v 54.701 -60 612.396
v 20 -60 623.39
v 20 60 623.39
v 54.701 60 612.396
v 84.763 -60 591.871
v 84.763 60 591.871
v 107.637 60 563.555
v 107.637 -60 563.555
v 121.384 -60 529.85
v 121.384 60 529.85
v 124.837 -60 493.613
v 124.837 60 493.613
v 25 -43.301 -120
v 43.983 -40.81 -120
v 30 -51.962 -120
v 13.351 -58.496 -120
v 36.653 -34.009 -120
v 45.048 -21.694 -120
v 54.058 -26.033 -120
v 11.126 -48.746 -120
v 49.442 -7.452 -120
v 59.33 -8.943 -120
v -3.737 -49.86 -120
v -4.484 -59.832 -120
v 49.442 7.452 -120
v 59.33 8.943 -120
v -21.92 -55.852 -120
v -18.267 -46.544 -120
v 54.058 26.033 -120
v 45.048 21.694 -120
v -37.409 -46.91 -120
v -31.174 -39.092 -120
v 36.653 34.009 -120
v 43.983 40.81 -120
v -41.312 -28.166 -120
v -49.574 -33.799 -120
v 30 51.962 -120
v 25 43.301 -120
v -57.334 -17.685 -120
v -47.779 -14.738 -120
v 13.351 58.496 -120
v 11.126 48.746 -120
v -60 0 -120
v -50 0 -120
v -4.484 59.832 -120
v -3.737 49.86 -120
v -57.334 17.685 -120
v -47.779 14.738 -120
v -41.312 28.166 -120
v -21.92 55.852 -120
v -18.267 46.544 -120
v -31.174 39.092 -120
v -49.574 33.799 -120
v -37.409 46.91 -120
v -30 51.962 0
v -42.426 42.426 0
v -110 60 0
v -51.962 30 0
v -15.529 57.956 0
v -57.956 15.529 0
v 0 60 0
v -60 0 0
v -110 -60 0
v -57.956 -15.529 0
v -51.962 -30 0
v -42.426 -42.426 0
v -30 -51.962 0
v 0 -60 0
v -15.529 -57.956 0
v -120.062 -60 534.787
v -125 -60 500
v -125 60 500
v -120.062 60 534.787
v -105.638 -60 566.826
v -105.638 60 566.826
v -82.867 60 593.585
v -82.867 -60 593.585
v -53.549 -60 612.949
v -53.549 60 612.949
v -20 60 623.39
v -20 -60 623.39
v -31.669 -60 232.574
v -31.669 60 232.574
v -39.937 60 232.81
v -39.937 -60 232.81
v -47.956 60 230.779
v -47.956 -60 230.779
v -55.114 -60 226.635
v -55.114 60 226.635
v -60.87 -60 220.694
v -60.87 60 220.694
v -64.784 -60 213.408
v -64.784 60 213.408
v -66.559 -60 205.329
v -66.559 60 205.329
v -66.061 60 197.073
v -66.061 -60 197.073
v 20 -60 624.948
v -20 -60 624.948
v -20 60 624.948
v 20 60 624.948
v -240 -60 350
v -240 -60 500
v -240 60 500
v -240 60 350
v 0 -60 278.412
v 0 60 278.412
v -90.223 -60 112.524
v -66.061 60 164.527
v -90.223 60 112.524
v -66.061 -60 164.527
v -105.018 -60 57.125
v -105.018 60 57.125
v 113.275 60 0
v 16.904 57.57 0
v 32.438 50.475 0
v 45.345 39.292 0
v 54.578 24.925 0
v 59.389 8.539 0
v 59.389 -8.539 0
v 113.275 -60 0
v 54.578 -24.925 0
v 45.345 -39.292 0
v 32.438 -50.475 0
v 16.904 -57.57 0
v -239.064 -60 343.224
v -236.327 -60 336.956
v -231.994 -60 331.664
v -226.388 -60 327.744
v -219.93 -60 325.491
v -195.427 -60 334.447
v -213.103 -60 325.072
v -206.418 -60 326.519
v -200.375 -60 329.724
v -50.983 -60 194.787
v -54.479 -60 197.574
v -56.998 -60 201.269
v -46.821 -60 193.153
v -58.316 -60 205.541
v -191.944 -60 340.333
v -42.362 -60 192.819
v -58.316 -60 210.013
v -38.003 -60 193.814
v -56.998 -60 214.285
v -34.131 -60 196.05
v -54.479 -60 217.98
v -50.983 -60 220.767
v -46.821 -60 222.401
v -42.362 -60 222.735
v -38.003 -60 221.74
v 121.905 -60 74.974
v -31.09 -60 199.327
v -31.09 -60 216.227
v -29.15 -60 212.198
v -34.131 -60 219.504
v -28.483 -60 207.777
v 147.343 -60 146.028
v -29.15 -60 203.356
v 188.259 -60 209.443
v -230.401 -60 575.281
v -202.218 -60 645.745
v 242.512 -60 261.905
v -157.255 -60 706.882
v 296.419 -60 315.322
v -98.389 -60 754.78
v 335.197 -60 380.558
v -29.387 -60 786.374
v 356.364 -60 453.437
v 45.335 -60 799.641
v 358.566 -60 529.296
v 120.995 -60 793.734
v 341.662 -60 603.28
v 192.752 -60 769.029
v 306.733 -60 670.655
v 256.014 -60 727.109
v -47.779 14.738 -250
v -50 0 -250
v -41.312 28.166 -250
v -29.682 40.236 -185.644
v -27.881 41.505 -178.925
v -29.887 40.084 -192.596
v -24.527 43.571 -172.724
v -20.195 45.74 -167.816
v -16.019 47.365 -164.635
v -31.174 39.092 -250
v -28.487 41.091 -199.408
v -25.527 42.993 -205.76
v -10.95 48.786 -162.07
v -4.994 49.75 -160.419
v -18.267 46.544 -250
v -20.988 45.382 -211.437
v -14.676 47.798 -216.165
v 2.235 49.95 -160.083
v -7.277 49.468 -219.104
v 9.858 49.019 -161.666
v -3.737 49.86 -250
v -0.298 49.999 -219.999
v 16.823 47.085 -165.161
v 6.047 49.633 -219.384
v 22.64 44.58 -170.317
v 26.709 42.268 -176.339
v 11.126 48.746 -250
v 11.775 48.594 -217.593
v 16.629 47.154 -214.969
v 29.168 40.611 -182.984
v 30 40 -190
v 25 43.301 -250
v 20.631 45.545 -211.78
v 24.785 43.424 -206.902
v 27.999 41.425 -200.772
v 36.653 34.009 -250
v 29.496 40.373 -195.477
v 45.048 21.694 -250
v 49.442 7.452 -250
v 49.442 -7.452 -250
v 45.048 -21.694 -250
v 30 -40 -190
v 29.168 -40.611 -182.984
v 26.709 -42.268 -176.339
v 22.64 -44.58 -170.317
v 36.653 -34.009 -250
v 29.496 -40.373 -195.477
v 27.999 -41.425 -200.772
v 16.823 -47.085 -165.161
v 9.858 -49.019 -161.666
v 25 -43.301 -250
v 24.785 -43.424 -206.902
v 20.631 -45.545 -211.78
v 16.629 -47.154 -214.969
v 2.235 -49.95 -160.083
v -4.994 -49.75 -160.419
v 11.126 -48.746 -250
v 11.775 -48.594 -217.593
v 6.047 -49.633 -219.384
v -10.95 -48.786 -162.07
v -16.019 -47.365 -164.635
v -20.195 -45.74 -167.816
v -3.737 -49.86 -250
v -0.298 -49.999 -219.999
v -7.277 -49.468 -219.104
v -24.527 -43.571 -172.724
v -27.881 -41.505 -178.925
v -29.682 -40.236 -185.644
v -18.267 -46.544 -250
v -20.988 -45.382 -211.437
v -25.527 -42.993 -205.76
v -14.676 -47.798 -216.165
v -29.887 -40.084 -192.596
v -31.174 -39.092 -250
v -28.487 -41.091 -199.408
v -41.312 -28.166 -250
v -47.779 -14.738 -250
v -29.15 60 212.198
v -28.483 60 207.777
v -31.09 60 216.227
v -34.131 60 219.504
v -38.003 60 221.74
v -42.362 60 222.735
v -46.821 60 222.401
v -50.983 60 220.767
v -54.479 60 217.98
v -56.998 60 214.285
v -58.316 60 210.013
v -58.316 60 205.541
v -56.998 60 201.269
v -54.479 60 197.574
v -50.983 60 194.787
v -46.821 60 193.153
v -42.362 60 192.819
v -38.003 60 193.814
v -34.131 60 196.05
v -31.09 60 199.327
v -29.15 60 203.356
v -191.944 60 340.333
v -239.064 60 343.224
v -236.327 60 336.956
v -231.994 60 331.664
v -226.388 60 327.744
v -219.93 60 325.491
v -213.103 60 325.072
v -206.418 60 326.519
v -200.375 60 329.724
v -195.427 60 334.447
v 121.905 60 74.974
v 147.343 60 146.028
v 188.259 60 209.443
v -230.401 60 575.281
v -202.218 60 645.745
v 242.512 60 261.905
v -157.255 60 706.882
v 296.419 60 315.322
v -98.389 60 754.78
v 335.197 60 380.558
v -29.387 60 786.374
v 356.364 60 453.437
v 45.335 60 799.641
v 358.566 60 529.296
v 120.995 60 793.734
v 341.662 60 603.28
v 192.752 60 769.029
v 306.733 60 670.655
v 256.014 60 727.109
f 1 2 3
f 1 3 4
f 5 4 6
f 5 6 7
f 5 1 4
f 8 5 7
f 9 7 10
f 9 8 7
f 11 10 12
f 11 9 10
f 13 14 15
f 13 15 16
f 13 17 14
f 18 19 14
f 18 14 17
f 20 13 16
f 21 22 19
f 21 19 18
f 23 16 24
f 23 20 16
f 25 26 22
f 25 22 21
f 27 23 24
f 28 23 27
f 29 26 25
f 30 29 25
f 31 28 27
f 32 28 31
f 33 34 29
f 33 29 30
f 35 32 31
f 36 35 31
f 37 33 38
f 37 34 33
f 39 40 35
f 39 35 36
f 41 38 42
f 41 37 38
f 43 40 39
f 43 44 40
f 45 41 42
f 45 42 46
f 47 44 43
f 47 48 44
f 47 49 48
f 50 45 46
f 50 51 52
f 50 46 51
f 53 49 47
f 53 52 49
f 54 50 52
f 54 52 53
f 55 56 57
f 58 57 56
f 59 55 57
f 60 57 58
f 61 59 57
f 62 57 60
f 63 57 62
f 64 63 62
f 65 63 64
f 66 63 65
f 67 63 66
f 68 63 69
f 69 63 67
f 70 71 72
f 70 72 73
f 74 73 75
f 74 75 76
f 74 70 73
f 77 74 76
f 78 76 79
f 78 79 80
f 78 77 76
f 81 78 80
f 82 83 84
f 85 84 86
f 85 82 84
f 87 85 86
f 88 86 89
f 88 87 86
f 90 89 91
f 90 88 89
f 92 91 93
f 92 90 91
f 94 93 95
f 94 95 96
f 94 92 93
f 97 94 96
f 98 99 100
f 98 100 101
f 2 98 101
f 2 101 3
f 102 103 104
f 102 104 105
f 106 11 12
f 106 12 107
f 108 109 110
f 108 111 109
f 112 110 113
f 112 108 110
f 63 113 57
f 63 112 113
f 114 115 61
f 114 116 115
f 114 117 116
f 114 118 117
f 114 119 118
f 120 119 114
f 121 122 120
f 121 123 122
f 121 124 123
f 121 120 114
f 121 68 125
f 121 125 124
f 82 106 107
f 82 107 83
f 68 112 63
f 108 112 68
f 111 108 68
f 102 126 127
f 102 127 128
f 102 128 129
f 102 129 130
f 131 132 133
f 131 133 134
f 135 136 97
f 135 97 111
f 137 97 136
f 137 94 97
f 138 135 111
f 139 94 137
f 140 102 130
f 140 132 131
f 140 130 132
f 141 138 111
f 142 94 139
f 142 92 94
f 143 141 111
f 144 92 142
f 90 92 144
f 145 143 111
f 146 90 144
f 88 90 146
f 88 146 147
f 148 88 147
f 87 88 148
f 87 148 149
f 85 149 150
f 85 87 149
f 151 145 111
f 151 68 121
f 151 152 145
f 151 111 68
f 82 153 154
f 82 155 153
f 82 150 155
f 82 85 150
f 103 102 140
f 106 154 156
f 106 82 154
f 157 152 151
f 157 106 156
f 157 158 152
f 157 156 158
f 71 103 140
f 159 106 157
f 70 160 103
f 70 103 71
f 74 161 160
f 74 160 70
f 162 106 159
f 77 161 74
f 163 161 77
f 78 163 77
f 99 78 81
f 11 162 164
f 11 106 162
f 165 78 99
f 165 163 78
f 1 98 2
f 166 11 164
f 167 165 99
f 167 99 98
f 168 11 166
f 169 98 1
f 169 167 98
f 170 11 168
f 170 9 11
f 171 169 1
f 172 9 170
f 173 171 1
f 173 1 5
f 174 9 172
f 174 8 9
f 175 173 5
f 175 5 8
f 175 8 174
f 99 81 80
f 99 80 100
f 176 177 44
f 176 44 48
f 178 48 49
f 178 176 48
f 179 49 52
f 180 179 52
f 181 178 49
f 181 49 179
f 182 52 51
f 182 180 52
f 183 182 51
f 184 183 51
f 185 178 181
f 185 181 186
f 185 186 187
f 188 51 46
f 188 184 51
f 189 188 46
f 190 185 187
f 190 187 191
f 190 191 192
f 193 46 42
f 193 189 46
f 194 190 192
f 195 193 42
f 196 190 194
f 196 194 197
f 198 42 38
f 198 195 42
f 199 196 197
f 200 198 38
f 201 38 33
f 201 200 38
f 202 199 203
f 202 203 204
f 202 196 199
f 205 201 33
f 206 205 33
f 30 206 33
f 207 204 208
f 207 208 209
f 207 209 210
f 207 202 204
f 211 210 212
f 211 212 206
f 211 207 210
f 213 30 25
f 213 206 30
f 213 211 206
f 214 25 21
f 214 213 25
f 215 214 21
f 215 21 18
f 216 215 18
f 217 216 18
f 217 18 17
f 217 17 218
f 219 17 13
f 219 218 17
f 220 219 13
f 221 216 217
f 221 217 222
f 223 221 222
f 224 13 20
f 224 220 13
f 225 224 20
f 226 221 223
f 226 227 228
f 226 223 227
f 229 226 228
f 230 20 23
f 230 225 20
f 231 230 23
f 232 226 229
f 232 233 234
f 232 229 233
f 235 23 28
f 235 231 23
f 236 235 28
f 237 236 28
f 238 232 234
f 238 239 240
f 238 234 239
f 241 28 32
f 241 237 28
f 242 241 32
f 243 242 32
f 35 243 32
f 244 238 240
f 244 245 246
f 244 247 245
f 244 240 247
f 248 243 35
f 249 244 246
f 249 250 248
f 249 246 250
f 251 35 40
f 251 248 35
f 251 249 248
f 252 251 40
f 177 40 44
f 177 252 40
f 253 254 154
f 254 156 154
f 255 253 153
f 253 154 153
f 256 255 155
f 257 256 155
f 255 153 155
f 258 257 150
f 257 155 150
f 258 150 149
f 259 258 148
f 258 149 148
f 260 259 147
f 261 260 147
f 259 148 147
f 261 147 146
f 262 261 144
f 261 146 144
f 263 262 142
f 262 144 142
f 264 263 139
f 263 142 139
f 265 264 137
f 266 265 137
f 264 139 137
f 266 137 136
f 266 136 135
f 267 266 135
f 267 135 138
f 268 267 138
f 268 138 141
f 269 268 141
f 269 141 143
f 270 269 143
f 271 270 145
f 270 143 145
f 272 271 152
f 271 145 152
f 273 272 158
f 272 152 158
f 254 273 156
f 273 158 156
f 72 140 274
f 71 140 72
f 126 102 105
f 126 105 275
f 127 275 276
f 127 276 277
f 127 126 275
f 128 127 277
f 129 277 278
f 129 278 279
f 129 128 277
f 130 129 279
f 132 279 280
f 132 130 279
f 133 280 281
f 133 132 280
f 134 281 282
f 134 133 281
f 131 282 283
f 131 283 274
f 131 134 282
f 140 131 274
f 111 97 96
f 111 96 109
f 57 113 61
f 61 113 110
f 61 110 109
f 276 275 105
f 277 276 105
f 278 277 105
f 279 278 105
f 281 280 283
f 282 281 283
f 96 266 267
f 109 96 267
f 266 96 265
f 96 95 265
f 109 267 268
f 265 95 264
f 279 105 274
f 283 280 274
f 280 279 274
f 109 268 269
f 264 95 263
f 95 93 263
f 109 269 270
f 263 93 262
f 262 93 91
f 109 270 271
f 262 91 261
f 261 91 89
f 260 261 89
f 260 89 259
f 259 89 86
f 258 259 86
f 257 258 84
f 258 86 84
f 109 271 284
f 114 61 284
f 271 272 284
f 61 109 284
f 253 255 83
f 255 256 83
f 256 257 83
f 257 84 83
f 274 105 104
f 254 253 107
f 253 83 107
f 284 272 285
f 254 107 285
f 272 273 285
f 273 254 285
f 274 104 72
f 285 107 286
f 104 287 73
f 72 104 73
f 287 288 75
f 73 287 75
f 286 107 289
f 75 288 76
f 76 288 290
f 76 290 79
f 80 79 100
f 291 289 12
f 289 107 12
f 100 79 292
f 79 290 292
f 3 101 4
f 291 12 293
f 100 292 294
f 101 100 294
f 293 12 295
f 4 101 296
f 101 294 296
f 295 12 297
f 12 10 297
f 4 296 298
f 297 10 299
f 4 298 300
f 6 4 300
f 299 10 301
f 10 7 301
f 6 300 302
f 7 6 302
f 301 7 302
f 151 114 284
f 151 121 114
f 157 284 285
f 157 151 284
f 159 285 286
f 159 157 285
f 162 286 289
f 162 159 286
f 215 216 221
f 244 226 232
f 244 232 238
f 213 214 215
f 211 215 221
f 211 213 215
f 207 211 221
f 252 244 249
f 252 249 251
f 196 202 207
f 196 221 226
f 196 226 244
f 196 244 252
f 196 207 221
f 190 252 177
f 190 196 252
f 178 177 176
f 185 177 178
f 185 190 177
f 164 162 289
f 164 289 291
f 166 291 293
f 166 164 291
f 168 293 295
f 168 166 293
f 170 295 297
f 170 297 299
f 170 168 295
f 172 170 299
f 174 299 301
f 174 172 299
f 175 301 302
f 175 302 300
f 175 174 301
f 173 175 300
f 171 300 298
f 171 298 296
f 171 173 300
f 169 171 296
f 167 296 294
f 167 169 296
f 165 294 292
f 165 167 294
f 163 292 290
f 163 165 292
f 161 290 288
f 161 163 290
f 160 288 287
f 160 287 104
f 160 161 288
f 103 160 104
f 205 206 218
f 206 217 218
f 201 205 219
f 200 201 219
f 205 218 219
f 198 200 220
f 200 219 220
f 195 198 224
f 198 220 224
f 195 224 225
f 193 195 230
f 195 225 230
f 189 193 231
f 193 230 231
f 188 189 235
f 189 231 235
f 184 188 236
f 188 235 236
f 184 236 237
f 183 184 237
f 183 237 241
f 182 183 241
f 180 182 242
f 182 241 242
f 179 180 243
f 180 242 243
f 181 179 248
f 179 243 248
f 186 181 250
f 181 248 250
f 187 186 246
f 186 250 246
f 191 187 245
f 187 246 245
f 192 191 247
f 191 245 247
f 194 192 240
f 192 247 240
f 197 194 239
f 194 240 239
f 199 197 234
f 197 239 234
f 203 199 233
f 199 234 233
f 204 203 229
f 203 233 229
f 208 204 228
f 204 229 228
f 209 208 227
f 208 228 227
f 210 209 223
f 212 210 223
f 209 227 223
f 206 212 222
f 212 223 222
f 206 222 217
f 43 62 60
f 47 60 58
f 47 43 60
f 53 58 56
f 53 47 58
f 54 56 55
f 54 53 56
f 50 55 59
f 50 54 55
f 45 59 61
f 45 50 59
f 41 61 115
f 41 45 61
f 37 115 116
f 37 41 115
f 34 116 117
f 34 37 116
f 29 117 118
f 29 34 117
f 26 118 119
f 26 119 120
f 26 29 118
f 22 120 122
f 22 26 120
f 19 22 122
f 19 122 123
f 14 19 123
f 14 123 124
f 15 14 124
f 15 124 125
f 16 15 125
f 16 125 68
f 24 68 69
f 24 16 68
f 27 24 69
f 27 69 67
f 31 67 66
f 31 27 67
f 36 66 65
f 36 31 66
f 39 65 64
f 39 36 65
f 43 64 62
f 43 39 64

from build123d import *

# Parameters (mm, degrees)
F3_DEPTH = 60
F4_R     = 30
F5_DEPTH = 112
F6_R     = 15
F7_DEPTH = 163


with BuildPart() as f2:
    # F1 (on Front) → F2 (revolve)
    with BuildSketch(Plane.XZ):
        Polygon((-50, -120), (-50, -250), (0, -250), (0, 0), (-60, 0), (-60, -120), align=None)
    revolve(axis=Axis((0, 0, -125), (0, 0, -1)))

    # F0 (on Front) → F3 (join, symmetric)
    with BuildSketch(Plane.XZ):
        with BuildLine():
            ThreePointArc((113.275358, 0), (147.343032, 146.027594), (242.512075, 261.904762))
            ThreePointArc((242.512075, 261.904762), (192.752359, 769.029387), (-240, 500))
            Line((-240, 500), (-125, 500))
            ThreePointArc((-125, 500), (-95.197164, 581.009259), (-20, 623.389627))
            Line((-20, 623.389627), (-20, 624.947867))
            Line((-20, 624.947867), (20, 624.947867))
            Line((20, 624.947867), (20, 623.389627))
            ThreePointArc((20, 623.389627), (97.236318, 578.549974), (124.836727, 493.613169))
            Line((124.836727, 493.613169), (0, 278.411619))
            Line((0, 278.411619), (-31.669397, 232.573897))
            ThreePointArc((-31.669397, 232.573897), (-58.197727, 223.86417), (-66.061109, 197.072774))
            Line((-66.061109, 197.072774), (-66.061109, 164.52672))
            ThreePointArc((-66.061109, 164.52672), (-98.826102, 85.146444), (-110, 0))
            Line((-110, 0), (113.275358, 0))
        make_face()
        with BuildLine():
            Line((-125, 500), (-240, 500))
            Line((-240, 500), (-240, 350))
            ThreePointArc((-240, 350), (-219.930134, 325.490945), (-191.944498, 340.333365))
            Line((-191.944498, 340.333365), (-125, 500))
        make_face()
    extrude(amount=F3_DEPTH, both=True)

    # F4 (on Front) → F5 (cut, symmetric)
    with BuildSketch(Plane.XZ):
        with Locations((0, -190)):
            Circle(F4_R)
    extrude(amount=F5_DEPTH, both=True, mode=Mode.SUBTRACT)

    # F6 (on face) → F7 (cut, symmetric)
    with BuildSketch(Plane.XZ.offset(60)):
        with Locations((-43.483209, 207.776994)):
            Circle(F6_R)
    extrude(amount=F7_DEPTH, both=True, mode=Mode.SUBTRACT)


solid = f2.part
